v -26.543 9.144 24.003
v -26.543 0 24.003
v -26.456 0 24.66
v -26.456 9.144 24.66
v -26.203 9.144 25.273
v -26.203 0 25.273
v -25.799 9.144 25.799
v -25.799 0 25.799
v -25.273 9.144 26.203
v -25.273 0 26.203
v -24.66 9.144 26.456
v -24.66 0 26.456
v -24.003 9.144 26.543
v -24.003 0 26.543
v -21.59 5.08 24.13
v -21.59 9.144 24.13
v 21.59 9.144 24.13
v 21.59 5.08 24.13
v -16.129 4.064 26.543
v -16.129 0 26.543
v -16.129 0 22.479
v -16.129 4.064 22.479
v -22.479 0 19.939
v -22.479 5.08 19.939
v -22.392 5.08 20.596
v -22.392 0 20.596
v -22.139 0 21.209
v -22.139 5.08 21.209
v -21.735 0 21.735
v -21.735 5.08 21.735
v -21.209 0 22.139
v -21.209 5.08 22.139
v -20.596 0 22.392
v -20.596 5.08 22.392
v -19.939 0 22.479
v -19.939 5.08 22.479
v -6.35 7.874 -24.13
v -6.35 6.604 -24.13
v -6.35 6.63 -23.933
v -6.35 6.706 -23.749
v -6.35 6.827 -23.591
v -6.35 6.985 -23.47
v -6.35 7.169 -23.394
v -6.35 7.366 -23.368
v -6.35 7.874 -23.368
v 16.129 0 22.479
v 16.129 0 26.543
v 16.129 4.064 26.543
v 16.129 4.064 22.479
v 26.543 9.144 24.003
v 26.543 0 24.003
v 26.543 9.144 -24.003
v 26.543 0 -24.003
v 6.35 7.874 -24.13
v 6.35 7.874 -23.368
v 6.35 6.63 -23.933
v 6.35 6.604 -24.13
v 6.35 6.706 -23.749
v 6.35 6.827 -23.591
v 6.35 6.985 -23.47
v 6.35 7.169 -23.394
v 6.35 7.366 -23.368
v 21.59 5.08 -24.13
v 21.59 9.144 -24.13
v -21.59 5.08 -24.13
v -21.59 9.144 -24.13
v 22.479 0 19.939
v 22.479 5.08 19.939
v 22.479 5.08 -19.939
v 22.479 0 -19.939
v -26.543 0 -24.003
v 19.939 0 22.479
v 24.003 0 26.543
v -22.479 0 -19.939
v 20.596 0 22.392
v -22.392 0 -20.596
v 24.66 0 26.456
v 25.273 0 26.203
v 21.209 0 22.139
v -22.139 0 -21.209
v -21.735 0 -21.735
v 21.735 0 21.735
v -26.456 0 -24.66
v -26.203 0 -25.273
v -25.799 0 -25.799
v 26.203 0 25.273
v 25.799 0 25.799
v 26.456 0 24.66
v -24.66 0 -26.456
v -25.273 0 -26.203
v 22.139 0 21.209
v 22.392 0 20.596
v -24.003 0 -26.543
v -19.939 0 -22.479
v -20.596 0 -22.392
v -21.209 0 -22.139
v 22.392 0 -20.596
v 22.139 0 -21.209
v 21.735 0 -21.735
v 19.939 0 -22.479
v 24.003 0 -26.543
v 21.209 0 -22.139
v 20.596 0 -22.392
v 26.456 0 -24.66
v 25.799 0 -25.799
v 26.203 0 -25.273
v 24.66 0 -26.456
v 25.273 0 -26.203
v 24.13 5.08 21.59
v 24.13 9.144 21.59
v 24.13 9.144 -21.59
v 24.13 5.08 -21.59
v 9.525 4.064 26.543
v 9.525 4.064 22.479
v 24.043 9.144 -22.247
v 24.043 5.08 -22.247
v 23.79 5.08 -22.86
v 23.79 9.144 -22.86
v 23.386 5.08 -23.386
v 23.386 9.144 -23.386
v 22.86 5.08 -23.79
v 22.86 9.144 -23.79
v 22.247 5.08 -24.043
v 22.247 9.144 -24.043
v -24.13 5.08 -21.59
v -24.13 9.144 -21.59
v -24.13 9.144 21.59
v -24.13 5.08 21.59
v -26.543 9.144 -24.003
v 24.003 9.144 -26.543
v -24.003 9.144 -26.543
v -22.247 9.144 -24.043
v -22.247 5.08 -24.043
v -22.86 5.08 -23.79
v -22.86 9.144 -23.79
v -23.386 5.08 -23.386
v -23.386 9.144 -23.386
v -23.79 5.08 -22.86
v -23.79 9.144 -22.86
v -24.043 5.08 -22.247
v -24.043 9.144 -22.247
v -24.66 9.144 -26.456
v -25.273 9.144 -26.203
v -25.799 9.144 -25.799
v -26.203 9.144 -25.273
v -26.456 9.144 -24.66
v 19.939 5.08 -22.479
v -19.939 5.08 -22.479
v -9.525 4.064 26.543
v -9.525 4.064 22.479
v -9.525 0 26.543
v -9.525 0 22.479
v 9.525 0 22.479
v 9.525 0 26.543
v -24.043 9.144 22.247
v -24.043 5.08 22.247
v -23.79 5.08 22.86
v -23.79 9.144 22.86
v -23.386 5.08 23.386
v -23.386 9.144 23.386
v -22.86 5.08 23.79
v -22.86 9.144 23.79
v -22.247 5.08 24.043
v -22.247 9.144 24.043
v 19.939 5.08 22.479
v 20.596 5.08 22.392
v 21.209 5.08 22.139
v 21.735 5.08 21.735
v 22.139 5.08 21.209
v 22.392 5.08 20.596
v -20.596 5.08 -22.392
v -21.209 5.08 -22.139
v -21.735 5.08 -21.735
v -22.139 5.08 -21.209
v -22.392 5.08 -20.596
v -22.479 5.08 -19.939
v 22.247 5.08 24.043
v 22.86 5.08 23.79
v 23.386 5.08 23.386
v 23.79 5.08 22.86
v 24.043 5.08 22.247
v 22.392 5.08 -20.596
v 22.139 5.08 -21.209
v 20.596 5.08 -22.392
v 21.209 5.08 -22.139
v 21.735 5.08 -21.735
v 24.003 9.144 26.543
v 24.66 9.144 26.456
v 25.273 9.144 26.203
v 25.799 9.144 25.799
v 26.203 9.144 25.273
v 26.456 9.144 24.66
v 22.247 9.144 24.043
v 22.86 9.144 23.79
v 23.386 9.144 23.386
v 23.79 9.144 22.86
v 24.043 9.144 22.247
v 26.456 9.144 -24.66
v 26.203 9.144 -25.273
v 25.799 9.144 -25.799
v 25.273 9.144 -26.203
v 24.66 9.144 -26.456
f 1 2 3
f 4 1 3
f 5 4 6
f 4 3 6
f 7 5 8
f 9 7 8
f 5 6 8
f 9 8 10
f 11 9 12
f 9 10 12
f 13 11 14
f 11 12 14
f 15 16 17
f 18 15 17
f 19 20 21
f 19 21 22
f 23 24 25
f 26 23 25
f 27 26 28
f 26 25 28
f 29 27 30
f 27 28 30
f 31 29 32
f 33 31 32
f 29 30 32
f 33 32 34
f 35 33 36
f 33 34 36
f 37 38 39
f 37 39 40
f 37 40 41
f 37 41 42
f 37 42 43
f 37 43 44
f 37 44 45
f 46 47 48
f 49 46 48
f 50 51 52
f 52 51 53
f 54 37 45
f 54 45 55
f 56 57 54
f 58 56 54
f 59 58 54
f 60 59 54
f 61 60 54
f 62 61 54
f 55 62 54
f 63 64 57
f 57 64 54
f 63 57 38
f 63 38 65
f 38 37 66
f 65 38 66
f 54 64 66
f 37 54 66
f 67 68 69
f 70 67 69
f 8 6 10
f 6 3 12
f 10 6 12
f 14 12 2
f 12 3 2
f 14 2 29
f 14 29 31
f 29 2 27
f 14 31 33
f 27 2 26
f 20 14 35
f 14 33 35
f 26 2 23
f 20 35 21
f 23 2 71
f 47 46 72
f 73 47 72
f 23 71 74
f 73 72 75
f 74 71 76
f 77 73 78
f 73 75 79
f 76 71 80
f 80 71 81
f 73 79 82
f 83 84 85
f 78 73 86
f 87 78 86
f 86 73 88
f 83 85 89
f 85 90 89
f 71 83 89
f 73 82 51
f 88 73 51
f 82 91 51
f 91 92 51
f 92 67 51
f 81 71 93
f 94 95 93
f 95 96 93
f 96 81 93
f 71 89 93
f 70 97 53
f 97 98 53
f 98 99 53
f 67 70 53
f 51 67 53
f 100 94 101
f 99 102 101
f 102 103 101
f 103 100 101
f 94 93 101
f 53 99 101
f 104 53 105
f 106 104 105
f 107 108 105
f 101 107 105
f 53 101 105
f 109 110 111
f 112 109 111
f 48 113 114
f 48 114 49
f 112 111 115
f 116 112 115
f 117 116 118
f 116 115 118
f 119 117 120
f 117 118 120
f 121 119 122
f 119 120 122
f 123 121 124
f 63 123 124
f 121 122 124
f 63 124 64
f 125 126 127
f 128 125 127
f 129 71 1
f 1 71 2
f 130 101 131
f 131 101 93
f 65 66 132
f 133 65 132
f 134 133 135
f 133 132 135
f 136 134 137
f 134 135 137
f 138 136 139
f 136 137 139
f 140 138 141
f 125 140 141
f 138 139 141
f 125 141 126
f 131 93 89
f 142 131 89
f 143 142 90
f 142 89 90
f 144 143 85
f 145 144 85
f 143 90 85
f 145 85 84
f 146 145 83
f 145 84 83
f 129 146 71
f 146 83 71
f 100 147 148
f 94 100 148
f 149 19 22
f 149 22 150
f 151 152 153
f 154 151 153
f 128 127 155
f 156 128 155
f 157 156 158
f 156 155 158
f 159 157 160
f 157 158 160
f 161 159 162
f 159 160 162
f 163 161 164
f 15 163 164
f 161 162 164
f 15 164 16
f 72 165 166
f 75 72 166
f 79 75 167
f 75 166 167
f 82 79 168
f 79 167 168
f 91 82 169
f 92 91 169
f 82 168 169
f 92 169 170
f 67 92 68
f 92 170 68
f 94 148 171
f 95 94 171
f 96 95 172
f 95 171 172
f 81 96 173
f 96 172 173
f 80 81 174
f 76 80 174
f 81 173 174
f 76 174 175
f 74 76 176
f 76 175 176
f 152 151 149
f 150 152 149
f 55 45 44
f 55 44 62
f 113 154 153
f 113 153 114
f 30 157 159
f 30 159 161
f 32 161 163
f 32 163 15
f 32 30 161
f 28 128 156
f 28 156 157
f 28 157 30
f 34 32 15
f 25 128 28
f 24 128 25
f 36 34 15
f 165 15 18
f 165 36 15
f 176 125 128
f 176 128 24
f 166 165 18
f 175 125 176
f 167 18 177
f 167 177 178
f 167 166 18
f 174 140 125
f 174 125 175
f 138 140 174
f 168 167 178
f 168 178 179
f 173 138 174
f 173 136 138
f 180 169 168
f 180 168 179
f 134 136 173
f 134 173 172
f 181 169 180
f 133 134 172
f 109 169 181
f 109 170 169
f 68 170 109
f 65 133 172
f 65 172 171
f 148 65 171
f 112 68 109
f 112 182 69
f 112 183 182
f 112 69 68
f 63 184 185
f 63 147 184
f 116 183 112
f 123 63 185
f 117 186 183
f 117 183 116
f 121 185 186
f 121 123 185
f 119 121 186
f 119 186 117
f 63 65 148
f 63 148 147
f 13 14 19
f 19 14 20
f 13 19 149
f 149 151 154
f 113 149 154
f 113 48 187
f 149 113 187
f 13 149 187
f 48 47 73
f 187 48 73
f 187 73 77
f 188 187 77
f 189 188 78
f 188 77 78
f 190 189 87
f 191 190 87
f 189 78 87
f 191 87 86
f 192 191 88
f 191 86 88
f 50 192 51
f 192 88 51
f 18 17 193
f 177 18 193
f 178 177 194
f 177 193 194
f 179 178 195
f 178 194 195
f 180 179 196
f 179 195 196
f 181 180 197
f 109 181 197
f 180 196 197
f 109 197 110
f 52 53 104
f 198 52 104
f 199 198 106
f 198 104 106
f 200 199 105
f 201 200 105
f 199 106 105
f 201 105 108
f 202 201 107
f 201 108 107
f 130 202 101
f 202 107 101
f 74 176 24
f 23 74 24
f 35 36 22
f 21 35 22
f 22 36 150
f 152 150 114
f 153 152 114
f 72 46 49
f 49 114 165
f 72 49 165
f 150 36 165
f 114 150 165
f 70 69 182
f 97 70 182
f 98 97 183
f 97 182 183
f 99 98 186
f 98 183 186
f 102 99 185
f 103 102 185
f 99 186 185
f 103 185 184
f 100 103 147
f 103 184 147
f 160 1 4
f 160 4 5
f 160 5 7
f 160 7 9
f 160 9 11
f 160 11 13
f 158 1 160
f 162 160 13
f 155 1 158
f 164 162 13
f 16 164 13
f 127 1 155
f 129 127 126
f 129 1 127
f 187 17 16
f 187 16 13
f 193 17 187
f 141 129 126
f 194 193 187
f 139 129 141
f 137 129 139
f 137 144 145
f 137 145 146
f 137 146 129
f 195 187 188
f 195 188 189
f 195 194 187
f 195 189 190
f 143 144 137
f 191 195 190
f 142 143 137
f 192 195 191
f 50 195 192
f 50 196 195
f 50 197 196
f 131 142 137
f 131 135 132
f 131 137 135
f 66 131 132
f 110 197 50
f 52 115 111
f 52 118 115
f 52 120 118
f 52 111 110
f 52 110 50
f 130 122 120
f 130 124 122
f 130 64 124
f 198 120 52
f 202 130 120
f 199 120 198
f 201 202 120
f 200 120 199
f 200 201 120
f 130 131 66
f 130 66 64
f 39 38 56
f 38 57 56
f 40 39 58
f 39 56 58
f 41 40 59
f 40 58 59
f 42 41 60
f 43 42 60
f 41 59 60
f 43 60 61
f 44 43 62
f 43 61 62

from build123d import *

# Parameters (mm, degrees)
BOSS_EXTRUDE2_DEPTH = 9.144
SKETCH2_W           = 6.604
SKETCH2_H           = 8.128
CUT_EXTRUDE1_DEPTH  = 49.022
CUT_EXTRUDE3_DEPTH  = 39.635145062
CUT_EXTRUDE4_DEPTH  = 4.064
SKETCH7_W           = 12.7
SKETCH7_H           = 1.27
BOSS_EXTRUDE3_DEPTH = 0.762
FILLET1_R           = 0.762


with BuildPart() as part:
    # Sketch1 → Boss-Extrude2 (new body)
    with BuildSketch(Plane(origin=(0, 0, 0), x_dir=(1, 0, 0), z_dir=(0, 1, 0))):
        with BuildLine():
            Line((-24.003, -26.543), (24.003, -26.543))
            ThreePointArc((24.003, -26.543), (25.799051224, -25.799051224), (26.543, -24.003))
            Line((26.543, -24.003), (26.543, 24.003))
            ThreePointArc((26.543, 24.003), (25.799051224, 25.799051224), (24.003, 26.543))
            Line((24.003, 26.543), (-24.003, 26.543))
            ThreePointArc((-24.003, 26.543), (-25.799051224, 25.799051224), (-26.543, 24.003))
            Line((-26.543, 24.003), (-26.543, -24.003))
            ThreePointArc((-26.543, -24.003), (-25.799051224, -25.799051224), (-24.003, -26.543))
        make_face()
    extrude(amount=BOSS_EXTRUDE2_DEPTH)

    # Sketch2 → Cut-Extrude1 (cut)
    with BuildSketch(Plane.XY.offset(26.543)):
        with Locations((12.827, 0)):
            Rectangle(SKETCH2_W, SKETCH2_H)
        with Locations((-12.827, 0)):
            Rectangle(SKETCH2_W, SKETCH2_H)
    extrude(amount=-CUT_EXTRUDE1_DEPTH, mode=Mode.SUBTRACT)

    # Sketch5 → Cut-Extrude3 (cut, through all)
    with BuildSketch(Plane(origin=(0, 9.144, 0), x_dir=(1, 0, 0), z_dir=(0, 1, 0))):
        with BuildLine():
            Line((-19.939, -22.479), (19.939, -22.479))
            ThreePointArc((19.939, -22.479), (21.735051224, -21.735051224), (22.479, -19.939))
            Line((22.479, -19.939), (22.479, 19.939))
            ThreePointArc((22.479, 19.939), (21.735051224, 21.735051224), (19.939, 22.479))
            Line((19.939, 22.479), (-19.939, 22.479))
            ThreePointArc((-19.939, 22.479), (-21.735051224, 21.735051224), (-22.479, 19.939))
            Line((-22.479, 19.939), (-22.479, -19.939))
            ThreePointArc((-22.479, -19.939), (-21.735051224, -21.735051224), (-19.939, -22.479))
        make_face()
    extrude(amount=-CUT_EXTRUDE3_DEPTH, mode=Mode.SUBTRACT)

    # Sketch6 → Cut-Extrude4 (cut)
    with BuildSketch(Plane(origin=(0, 9.144, 0), x_dir=(1, 0, 0), z_dir=(0, 1, 0))):
        with BuildLine():
            Line((-21.59, -24.13), (21.59, -24.13))
            ThreePointArc((21.59, -24.13), (23.386051224, -23.386051224), (24.13, -21.59))
            Line((24.13, -21.59), (24.13, 21.59))
            ThreePointArc((24.13, 21.59), (23.386051224, 23.386051224), (21.59, 24.13))
            Line((21.59, 24.13), (-21.59, 24.13))
            ThreePointArc((-21.59, 24.13), (-23.386051224, 23.386051224), (-24.13, 21.59))
            Line((-24.13, 21.59), (-24.13, -21.59))
            ThreePointArc((-24.13, -21.59), (-23.386051224, -23.386051224), (-21.59, -24.13))
        make_face()
    extrude(amount=-CUT_EXTRUDE4_DEPTH, mode=Mode.SUBTRACT)

    # Sketch7 → Boss-Extrude3 (add)
    with BuildSketch(Plane.XY.offset(-24.13)):
        with Locations((0, 7.239)):
            Rectangle(SKETCH7_W, SKETCH7_H)
    extrude(amount=BOSS_EXTRUDE3_DEPTH)

    # Fillet1
    fillet1_edges = [part.edges().sort_by_distance(p)[0] for p in [
        (0, 6.604, -23.368),
    ]]
    fillet(fillet1_edges, radius=FILLET1_R - 0.0001)  # a hair under: the kernel refuses the full size


solid = part.part
